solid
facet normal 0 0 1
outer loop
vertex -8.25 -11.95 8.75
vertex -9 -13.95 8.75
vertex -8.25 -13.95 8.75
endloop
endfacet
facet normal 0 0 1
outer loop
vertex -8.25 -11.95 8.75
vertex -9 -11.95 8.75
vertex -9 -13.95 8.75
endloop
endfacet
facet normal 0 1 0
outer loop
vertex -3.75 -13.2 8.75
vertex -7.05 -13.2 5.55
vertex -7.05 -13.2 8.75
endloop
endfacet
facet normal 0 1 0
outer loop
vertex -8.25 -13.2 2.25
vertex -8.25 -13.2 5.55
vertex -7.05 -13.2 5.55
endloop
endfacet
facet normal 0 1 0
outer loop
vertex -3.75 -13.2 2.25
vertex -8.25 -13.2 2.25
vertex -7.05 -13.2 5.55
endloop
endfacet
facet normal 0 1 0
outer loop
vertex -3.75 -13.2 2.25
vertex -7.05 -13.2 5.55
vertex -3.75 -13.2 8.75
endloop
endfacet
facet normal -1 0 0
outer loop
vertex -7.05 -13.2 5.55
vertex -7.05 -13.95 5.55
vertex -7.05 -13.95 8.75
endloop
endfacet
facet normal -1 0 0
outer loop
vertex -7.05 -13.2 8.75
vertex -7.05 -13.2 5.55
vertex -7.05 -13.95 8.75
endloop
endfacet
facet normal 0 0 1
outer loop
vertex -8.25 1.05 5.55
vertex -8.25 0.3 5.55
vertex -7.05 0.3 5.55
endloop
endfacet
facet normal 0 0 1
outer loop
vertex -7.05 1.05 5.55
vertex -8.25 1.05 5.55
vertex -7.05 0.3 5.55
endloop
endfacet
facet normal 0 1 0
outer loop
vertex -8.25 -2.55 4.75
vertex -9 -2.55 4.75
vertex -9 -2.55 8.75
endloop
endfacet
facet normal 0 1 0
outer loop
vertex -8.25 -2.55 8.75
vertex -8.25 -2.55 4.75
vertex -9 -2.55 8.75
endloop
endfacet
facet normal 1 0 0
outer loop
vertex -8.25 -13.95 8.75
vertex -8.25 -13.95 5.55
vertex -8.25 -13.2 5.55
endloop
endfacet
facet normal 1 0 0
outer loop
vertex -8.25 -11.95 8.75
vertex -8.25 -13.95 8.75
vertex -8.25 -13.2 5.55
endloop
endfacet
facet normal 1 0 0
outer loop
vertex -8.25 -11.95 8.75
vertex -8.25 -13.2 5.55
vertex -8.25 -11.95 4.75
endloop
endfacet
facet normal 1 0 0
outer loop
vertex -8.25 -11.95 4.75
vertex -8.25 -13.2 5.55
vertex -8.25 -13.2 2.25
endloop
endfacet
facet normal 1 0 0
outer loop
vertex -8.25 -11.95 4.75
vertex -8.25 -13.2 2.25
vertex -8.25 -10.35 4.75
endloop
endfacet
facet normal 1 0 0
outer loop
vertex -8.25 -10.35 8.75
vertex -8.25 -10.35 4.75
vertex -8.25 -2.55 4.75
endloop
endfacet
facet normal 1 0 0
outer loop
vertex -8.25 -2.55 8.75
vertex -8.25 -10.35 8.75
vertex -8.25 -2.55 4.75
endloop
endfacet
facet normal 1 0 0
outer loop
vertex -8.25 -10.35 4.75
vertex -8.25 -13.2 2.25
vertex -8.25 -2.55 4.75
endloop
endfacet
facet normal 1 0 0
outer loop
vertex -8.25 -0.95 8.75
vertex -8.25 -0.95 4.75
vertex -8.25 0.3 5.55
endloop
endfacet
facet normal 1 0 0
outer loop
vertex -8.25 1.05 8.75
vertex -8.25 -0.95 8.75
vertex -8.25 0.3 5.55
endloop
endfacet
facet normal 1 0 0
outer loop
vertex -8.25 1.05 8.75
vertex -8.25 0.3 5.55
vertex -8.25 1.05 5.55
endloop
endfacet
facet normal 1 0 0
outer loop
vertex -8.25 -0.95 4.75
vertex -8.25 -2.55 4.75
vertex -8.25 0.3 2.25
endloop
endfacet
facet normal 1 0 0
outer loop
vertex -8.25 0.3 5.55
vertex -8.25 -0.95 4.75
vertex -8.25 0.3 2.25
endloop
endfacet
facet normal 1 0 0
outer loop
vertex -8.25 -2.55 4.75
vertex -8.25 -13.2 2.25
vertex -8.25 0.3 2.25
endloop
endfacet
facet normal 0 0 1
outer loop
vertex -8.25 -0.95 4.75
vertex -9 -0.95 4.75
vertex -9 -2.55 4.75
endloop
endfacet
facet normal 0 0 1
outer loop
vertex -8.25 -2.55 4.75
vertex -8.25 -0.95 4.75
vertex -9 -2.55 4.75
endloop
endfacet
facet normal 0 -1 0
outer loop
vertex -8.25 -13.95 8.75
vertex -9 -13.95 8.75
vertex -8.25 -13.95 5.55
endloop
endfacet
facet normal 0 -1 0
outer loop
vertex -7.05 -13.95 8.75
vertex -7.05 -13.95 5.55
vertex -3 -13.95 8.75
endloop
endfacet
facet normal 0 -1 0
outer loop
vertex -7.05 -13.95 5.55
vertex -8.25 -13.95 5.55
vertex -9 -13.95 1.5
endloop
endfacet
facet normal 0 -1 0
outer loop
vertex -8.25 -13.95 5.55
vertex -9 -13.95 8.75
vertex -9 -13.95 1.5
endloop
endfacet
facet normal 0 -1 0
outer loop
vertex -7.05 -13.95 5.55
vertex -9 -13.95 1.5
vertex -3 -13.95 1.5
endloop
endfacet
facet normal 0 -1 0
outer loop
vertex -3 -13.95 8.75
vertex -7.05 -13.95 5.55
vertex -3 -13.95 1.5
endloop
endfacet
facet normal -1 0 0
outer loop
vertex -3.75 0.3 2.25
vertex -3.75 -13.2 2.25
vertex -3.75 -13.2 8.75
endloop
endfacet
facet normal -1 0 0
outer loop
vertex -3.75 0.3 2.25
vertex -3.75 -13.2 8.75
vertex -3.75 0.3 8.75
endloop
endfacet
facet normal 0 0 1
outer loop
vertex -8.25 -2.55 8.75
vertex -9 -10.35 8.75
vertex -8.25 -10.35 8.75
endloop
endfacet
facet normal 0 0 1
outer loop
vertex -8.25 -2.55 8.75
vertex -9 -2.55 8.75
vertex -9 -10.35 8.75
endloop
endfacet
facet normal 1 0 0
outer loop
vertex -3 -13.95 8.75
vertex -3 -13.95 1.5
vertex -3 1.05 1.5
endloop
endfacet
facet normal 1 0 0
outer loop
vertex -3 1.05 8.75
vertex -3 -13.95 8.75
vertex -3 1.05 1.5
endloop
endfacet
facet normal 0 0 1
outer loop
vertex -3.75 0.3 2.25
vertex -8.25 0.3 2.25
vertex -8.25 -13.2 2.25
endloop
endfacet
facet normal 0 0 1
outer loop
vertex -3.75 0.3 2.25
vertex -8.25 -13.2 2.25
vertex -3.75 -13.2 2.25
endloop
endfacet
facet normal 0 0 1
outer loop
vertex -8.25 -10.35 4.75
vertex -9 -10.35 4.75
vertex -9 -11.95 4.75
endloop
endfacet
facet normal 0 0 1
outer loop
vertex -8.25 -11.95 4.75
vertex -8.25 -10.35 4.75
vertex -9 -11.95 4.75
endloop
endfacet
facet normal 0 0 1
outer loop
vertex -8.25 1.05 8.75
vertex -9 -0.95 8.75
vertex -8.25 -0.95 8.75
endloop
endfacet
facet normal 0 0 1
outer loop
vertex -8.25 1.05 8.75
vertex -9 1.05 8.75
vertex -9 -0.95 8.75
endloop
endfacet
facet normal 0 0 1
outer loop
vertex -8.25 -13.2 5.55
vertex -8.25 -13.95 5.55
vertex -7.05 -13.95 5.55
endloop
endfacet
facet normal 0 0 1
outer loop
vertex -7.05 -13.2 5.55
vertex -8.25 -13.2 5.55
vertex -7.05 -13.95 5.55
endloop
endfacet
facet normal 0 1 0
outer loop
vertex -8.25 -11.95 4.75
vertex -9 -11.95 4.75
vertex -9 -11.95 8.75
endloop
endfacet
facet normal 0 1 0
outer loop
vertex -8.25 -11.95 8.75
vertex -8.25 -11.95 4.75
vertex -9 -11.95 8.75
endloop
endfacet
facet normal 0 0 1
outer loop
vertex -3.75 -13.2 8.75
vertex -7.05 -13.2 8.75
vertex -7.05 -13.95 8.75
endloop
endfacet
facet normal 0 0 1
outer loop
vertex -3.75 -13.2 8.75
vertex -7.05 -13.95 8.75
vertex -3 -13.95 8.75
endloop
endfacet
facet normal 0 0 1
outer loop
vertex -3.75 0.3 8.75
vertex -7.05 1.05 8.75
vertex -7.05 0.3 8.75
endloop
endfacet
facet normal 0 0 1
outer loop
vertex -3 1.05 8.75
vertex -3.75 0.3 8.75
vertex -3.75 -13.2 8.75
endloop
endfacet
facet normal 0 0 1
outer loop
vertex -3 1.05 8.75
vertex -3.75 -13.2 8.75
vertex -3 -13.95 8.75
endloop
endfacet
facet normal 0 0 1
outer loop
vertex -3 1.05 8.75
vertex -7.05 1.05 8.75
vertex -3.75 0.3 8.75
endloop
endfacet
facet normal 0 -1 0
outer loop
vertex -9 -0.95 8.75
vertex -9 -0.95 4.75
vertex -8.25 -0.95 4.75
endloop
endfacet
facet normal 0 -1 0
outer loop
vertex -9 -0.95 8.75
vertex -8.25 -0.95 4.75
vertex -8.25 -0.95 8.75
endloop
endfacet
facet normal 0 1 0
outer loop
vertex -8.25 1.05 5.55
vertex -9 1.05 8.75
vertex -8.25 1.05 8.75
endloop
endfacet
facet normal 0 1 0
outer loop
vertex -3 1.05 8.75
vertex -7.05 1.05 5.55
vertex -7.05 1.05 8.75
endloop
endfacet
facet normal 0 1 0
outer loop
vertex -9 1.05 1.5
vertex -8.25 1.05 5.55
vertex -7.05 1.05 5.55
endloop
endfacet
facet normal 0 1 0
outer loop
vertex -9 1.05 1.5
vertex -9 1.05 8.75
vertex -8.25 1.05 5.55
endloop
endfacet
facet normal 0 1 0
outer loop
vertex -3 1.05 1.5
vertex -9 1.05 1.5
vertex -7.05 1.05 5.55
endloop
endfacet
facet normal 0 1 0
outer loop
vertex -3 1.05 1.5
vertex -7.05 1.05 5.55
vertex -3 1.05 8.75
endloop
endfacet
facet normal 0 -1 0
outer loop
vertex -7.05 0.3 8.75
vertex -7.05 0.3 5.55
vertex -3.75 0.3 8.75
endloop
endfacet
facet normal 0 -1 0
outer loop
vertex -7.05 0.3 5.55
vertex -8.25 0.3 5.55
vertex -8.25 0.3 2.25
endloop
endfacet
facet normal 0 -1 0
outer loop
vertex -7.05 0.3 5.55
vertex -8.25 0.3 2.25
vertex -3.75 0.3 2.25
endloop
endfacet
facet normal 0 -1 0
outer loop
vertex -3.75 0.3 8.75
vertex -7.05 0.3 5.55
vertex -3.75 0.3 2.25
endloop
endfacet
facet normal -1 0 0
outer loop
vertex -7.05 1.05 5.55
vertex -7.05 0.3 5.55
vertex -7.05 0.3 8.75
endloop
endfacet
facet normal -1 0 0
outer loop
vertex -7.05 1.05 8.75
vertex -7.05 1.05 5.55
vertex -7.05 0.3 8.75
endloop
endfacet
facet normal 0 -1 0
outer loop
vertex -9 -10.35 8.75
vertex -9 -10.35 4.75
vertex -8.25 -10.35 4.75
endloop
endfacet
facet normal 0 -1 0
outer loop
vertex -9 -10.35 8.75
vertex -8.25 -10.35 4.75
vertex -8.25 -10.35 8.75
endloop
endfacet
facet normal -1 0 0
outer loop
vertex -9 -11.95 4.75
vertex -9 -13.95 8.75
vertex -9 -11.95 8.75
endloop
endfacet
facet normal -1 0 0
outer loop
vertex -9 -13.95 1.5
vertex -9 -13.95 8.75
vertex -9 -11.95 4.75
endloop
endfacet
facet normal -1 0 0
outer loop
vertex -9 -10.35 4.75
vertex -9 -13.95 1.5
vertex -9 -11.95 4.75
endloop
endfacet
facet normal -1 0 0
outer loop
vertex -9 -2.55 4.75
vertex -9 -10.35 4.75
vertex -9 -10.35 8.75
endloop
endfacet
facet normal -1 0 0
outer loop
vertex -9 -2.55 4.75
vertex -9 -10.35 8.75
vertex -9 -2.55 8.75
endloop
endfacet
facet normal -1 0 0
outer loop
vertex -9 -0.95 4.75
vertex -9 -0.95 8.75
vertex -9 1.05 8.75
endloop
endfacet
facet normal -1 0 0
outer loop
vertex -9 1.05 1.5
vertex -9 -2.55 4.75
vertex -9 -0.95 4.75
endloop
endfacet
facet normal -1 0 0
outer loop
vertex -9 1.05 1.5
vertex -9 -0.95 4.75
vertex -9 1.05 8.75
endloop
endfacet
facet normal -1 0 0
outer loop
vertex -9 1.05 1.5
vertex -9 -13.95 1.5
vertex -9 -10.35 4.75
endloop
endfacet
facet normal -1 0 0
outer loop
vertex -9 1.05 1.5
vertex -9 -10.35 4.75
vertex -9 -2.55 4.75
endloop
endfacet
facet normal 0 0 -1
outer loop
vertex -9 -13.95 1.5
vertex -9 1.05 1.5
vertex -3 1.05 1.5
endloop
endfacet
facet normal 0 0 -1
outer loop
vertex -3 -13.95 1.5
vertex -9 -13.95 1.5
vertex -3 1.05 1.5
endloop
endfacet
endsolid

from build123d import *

# Parameters (mm, degrees)
BOX001_W        = 4.5
BOX001_H        = 13.5
BOX001_DEPTH    = 6.5
THICKNESS_T     = 0.75
SKETCH002_W     = 1.6
SKETCH002_H     = 4
POCKET001_DEPTH = 0.75
SKETCH003_W     = 1.2
SKETCH003_H     = 3.2
POCKET002_DEPTH = 15.001


with BuildPart() as part:
    # Box001 → Box001 (new body)
    with BuildSketch(Plane(origin=(-8.25, -13.2, 2.25), x_dir=(1, 0, 0), z_dir=(0, 0, 1))):
        with Locations((2.25, 6.75)):
            Rectangle(BOX001_W, BOX001_H)
    extrude(amount=BOX001_DEPTH)

    # Thickness
    thickness_openings = [part.faces().sort_by_distance(p)[0] for p in [
        (-6, -6.45, 8.75),
    ]]
    offset(amount=THICKNESS_T, openings=thickness_openings, kind=Kind.INTERSECTION)

    # Sketch002 → Pocket001 (cut)
    with BuildSketch(Plane(origin=(-9, 0, 0), x_dir=(0, -1, 0), z_dir=(-1, 0, 0))):
        with Locations((1.75, 6.75)):
            Rectangle(SKETCH002_W, SKETCH002_H)
        with Locations((11.15, 6.75)):
            Rectangle(SKETCH002_W, SKETCH002_H)
    extrude(amount=-POCKET001_DEPTH, mode=Mode.SUBTRACT)

    # Sketch003 → Pocket002 (cut, through all)
    with BuildSketch(Plane.XZ.offset(13.95)):
        with Locations((-7.65, 7.15)):
            Rectangle(SKETCH003_W, SKETCH003_H)
    extrude(amount=-POCKET002_DEPTH, mode=Mode.SUBTRACT)


solid = part.part
